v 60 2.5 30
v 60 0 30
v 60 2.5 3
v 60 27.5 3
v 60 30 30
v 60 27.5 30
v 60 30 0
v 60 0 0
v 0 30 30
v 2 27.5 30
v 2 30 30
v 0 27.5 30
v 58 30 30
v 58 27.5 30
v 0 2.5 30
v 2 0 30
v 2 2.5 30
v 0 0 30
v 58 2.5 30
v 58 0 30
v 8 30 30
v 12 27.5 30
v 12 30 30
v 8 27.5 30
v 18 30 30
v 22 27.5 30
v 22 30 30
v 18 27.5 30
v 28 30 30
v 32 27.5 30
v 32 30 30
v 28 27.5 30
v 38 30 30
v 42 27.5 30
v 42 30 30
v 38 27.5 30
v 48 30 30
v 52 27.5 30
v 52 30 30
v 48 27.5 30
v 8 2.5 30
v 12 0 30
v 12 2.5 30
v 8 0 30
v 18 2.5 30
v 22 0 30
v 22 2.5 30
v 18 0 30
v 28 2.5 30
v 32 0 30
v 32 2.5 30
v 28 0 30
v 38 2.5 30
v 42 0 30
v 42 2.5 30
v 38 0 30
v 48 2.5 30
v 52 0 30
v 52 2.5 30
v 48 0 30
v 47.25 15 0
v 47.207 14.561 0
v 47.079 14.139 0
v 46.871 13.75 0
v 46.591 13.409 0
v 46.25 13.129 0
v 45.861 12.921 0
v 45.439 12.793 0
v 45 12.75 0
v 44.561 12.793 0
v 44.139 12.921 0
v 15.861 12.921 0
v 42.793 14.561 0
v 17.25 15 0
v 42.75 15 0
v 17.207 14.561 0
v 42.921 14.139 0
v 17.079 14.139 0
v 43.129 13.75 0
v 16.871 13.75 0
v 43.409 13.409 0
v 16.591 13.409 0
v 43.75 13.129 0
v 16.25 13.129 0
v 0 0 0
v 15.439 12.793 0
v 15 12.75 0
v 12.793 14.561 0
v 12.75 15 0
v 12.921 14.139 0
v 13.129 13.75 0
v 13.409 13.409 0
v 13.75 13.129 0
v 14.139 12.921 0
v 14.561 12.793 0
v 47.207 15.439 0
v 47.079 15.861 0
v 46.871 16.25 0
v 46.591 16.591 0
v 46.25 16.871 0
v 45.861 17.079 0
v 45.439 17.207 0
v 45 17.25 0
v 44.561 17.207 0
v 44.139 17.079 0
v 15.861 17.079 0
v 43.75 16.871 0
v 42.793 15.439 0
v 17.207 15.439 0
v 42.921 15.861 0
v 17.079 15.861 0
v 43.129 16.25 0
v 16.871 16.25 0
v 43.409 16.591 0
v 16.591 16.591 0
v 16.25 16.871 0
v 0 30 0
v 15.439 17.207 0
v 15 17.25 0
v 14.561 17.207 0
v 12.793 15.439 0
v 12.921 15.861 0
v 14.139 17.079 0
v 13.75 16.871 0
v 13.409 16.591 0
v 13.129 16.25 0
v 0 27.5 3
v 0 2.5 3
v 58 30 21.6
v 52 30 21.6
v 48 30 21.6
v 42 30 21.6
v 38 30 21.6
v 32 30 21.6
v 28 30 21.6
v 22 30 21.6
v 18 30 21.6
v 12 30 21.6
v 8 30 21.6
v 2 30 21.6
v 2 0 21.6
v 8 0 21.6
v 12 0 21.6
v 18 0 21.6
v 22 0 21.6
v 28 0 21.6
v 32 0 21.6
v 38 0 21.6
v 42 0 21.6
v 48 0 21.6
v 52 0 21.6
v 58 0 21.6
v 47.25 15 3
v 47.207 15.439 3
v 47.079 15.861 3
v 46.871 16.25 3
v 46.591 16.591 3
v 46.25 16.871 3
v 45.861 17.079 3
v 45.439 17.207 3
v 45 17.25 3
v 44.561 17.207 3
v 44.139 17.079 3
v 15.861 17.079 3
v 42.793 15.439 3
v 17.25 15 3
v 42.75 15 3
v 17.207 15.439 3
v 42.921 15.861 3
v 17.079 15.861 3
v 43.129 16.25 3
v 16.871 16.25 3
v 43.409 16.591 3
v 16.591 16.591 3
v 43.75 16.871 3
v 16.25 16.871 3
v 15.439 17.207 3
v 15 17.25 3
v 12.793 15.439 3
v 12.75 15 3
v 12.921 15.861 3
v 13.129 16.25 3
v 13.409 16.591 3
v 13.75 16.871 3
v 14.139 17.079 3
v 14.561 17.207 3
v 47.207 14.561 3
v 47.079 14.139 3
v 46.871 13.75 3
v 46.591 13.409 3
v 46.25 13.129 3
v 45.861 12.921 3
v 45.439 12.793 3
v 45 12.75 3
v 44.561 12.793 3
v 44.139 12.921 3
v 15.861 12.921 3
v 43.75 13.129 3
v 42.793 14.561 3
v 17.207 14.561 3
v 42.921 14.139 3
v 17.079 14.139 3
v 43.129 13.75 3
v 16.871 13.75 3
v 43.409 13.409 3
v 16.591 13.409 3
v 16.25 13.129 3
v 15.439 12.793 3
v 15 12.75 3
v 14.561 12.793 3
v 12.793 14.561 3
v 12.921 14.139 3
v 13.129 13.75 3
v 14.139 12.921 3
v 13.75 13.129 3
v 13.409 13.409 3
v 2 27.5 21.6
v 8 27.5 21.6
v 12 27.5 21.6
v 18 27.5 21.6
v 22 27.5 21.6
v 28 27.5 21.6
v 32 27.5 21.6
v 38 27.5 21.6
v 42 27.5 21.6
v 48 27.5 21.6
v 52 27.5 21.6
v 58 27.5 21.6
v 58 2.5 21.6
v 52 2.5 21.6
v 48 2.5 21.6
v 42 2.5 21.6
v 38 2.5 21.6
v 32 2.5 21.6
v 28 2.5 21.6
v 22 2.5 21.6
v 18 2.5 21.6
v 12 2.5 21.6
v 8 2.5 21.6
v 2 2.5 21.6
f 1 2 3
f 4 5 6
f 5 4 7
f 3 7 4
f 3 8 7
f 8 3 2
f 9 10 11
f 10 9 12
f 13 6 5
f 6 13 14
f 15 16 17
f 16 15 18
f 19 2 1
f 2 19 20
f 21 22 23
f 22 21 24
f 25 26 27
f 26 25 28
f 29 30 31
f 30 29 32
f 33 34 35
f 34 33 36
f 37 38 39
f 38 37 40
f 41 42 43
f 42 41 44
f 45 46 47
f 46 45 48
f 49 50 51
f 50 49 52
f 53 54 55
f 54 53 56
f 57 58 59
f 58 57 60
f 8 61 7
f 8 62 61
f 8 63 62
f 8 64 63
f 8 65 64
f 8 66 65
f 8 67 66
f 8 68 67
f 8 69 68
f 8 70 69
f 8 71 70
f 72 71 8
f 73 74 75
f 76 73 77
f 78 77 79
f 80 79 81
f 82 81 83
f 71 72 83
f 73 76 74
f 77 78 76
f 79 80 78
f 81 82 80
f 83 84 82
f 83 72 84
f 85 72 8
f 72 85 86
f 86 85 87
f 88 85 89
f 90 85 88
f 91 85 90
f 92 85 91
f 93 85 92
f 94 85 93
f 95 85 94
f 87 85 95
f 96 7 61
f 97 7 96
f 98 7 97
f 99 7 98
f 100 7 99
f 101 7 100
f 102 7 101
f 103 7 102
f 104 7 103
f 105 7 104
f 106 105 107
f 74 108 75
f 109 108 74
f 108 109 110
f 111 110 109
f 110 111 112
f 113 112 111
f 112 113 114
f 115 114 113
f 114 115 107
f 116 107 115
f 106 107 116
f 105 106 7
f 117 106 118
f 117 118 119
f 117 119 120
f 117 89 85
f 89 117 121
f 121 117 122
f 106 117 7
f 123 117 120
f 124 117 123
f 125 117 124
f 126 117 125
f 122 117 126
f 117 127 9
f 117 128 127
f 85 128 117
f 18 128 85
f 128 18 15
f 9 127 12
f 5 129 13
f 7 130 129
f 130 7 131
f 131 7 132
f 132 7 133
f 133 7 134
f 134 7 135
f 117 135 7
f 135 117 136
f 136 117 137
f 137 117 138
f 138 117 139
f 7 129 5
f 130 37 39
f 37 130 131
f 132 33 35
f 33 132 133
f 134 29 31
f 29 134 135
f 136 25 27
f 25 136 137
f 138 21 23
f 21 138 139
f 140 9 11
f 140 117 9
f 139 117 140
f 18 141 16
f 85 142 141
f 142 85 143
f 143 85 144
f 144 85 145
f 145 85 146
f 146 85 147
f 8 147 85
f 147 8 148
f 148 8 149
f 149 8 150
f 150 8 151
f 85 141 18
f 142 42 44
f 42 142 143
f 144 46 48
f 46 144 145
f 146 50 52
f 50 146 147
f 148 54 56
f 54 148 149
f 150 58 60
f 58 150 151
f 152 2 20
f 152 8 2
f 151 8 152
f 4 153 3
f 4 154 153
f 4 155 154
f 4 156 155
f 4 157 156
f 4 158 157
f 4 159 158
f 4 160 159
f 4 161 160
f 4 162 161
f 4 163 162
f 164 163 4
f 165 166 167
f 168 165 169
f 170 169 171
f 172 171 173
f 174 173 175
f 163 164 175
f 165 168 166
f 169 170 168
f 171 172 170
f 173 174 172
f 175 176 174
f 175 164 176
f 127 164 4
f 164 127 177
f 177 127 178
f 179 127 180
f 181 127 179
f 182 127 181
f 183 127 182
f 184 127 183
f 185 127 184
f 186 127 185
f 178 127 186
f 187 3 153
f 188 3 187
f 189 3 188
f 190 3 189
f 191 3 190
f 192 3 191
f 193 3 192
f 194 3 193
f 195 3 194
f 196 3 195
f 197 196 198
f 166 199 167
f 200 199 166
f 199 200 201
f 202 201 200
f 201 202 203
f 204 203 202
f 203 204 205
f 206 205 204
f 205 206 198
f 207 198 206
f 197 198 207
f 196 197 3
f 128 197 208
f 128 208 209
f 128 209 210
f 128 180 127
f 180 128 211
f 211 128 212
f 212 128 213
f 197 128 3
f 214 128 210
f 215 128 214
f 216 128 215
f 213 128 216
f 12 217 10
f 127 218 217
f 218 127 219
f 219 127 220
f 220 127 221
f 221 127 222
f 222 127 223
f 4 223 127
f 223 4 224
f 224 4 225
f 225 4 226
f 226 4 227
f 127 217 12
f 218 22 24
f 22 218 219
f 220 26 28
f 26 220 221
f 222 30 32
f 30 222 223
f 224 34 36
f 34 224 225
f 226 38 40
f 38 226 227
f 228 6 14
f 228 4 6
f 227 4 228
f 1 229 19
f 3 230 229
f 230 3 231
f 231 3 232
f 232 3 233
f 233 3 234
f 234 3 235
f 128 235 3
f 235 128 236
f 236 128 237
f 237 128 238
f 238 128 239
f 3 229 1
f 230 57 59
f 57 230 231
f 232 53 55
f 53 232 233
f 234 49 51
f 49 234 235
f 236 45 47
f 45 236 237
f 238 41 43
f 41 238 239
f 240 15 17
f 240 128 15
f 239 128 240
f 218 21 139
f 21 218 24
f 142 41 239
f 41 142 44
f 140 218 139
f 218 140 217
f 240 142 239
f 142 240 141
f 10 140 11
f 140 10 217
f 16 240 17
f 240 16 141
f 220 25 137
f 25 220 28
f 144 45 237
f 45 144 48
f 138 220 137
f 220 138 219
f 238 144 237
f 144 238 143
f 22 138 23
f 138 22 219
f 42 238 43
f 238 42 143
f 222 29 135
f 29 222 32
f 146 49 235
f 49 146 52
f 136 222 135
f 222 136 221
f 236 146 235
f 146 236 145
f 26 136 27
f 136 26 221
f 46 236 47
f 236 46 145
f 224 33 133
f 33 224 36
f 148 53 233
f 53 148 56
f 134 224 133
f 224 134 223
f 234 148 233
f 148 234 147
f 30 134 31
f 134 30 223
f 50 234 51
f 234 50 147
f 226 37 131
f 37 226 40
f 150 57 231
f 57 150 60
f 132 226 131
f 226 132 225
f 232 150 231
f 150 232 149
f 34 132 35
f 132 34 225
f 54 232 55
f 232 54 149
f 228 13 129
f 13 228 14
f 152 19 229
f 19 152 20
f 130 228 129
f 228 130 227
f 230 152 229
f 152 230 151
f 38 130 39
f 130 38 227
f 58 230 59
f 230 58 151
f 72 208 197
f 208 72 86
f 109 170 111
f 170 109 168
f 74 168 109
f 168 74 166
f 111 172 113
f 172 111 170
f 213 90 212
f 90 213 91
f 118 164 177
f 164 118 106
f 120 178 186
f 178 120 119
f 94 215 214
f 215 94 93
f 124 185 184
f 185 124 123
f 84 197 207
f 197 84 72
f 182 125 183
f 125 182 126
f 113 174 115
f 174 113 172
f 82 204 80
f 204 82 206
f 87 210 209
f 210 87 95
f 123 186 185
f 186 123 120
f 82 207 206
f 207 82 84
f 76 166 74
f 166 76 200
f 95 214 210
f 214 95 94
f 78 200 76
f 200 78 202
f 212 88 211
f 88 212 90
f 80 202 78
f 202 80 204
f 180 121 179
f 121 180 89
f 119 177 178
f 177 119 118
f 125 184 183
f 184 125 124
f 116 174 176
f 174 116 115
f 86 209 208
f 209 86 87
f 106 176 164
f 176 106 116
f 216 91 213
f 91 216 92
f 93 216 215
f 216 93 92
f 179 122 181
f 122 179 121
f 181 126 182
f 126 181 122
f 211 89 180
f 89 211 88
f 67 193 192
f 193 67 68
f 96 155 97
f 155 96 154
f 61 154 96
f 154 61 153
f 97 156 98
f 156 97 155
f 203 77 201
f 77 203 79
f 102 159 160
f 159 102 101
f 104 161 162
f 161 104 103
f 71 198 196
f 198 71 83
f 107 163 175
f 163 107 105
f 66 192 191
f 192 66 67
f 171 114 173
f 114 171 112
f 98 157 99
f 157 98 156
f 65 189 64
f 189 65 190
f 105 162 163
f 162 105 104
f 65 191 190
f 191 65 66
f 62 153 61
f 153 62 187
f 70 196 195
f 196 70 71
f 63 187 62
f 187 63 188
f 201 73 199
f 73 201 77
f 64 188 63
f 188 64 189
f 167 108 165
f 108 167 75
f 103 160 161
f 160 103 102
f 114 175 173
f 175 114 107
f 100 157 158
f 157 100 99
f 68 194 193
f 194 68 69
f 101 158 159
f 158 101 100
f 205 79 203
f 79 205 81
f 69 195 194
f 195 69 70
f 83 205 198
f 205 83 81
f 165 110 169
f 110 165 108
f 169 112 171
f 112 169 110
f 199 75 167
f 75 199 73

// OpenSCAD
$fn = 32;

// ----------------------------------------------------------------------
// Cable duct: 60 x 30 x 30 mm, 6 fingers
// ----------------------------------------------------------------------

// --- parameters (mm) ---
tray_len = 60;            // duct length, X
tray_w = 30;              // duct width, Y
tray_h = 30;              // duct height, Z
tray_t = 2.5;             // side wall thickness
floor_t = 3;              // floor thickness
slot_w = 6;               // finger slot width
slot_h = 18.6;            // finger slot height
fingers = 6;              // number of finger slots per side
pitch = 10;               // finger pitch
hole_d = 4.5;             // floor mounting hole
hole_n = 2;               // mounting holes in the floor

module shell() {
  difference() {
    cube([tray_len, tray_w, tray_h]);
    /* open top channel */
    translate([-tray_t - 1, tray_t, floor_t])
      cube([tray_len + 2 * tray_t + 2, tray_w - 2 * tray_t, tray_h + 1]);
  }
}

difference() {
  union() {
    shell();
  }
  /* finger slots cut through both side walls */
  for (i = [0 : fingers - 1]) translate([pitch / 2 + i * pitch - slot_w / 2, -1, floor_t + slot_h]) cube([slot_w, tray_w + 2, tray_h]);
  for (i = [0 : hole_n - 1]) translate([(tray_len / hole_n) * (i + 0.5), tray_w / 2, -1]) cylinder(h = floor_t + 2, d = hole_d);
}
